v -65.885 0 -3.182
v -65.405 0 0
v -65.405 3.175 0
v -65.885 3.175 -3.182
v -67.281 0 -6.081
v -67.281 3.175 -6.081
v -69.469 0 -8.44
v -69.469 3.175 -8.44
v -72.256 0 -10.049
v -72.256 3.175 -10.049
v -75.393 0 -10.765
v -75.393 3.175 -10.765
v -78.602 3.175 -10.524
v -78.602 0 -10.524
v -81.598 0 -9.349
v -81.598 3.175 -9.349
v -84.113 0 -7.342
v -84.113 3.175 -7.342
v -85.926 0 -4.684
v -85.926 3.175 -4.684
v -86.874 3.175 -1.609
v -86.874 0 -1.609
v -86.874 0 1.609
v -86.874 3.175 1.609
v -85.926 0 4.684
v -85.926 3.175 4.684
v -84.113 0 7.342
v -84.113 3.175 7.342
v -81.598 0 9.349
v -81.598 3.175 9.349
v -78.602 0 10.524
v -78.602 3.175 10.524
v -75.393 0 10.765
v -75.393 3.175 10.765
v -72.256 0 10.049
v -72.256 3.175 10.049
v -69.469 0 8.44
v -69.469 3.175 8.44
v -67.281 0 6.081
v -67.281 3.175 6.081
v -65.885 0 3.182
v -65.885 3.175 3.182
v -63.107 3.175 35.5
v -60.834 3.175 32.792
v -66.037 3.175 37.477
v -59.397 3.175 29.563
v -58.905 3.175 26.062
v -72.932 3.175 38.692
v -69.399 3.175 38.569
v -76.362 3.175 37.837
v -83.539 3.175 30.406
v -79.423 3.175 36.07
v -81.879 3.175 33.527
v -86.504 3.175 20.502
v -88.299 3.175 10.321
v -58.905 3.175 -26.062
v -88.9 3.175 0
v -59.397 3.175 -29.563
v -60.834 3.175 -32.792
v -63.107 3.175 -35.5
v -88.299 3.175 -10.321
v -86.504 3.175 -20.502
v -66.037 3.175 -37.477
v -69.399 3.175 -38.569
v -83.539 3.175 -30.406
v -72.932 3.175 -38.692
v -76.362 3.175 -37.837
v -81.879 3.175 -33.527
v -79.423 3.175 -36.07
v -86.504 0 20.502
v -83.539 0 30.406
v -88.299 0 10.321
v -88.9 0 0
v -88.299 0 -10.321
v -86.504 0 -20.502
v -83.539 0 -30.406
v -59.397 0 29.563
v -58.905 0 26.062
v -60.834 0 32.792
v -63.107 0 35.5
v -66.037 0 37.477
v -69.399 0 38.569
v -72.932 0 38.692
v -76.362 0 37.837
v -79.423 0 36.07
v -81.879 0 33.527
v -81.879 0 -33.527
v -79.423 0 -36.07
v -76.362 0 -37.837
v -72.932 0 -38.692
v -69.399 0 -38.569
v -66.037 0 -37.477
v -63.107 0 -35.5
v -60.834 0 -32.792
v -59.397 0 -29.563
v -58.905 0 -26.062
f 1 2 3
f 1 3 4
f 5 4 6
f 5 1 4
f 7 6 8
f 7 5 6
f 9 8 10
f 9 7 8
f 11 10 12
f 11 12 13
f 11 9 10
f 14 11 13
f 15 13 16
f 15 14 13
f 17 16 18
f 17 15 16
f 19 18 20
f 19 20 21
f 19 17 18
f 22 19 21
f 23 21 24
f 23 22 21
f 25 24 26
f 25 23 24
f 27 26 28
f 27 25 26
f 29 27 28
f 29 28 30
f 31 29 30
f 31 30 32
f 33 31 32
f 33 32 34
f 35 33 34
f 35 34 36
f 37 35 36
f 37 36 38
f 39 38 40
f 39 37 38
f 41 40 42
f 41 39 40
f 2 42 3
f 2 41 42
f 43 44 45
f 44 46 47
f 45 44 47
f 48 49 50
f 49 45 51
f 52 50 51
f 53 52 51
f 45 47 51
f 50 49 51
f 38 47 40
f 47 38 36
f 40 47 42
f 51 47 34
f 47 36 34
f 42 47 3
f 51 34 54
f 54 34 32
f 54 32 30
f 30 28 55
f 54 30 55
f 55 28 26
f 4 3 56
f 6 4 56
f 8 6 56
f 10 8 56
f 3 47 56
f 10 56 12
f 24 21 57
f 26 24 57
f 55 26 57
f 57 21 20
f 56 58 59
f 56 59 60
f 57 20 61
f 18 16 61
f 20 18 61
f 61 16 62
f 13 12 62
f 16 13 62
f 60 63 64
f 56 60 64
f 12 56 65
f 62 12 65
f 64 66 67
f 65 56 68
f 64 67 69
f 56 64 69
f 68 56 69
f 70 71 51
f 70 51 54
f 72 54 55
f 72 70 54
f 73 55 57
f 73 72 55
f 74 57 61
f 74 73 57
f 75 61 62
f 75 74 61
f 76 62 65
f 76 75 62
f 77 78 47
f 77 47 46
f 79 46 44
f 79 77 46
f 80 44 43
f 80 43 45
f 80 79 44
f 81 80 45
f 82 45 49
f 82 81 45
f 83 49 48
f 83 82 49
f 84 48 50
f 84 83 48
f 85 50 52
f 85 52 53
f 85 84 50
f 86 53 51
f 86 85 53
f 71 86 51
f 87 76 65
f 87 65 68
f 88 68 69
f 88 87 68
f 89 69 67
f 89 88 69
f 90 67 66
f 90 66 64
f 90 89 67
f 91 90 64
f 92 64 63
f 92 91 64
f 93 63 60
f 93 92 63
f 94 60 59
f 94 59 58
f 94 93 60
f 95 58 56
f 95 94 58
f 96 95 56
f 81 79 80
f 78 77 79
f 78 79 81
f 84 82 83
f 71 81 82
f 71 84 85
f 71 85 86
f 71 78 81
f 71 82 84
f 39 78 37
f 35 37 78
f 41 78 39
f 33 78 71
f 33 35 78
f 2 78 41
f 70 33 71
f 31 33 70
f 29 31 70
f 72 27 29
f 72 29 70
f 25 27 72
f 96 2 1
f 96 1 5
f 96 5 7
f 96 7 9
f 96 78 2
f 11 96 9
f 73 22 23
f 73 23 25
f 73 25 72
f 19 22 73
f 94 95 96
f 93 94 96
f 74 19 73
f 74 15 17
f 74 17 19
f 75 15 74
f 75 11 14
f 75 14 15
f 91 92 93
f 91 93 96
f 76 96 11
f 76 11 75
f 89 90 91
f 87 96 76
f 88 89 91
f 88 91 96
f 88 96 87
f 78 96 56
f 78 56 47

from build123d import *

# Parameters (mm, degrees)
SKETCH1_R           = 10.795
BOSS_EXTRUDE2_DEPTH = 3.175


with BuildPart() as part:
    # Sketch1 → Boss-Extrude2 (new body)
    with BuildSketch(Plane(origin=(0, 0, 0), x_dir=(1, 0, 0), z_dir=(0, 1, 0))):
        with BuildLine():
            Line((-58.904577704, 26.061934921), (-58.904577704, -26.061934921))
            ThreePointArc((-58.904577704, -26.061934921), (-69.399245848, -38.568993385), (-83.538673988, -30.405590742))
            ThreePointArc((-83.538673988, -30.405590742), (-88.9, 0), (-83.538673988, 30.405590742))
            ThreePointArc((-83.538673988, 30.405590742), (-69.399245848, 38.568993385), (-58.904577704, 26.061934921))
        make_face()
        with Locations((-76.2, 0)):
            Circle(SKETCH1_R, mode=Mode.SUBTRACT)
    extrude(amount=BOSS_EXTRUDE2_DEPTH)


solid = part.part
